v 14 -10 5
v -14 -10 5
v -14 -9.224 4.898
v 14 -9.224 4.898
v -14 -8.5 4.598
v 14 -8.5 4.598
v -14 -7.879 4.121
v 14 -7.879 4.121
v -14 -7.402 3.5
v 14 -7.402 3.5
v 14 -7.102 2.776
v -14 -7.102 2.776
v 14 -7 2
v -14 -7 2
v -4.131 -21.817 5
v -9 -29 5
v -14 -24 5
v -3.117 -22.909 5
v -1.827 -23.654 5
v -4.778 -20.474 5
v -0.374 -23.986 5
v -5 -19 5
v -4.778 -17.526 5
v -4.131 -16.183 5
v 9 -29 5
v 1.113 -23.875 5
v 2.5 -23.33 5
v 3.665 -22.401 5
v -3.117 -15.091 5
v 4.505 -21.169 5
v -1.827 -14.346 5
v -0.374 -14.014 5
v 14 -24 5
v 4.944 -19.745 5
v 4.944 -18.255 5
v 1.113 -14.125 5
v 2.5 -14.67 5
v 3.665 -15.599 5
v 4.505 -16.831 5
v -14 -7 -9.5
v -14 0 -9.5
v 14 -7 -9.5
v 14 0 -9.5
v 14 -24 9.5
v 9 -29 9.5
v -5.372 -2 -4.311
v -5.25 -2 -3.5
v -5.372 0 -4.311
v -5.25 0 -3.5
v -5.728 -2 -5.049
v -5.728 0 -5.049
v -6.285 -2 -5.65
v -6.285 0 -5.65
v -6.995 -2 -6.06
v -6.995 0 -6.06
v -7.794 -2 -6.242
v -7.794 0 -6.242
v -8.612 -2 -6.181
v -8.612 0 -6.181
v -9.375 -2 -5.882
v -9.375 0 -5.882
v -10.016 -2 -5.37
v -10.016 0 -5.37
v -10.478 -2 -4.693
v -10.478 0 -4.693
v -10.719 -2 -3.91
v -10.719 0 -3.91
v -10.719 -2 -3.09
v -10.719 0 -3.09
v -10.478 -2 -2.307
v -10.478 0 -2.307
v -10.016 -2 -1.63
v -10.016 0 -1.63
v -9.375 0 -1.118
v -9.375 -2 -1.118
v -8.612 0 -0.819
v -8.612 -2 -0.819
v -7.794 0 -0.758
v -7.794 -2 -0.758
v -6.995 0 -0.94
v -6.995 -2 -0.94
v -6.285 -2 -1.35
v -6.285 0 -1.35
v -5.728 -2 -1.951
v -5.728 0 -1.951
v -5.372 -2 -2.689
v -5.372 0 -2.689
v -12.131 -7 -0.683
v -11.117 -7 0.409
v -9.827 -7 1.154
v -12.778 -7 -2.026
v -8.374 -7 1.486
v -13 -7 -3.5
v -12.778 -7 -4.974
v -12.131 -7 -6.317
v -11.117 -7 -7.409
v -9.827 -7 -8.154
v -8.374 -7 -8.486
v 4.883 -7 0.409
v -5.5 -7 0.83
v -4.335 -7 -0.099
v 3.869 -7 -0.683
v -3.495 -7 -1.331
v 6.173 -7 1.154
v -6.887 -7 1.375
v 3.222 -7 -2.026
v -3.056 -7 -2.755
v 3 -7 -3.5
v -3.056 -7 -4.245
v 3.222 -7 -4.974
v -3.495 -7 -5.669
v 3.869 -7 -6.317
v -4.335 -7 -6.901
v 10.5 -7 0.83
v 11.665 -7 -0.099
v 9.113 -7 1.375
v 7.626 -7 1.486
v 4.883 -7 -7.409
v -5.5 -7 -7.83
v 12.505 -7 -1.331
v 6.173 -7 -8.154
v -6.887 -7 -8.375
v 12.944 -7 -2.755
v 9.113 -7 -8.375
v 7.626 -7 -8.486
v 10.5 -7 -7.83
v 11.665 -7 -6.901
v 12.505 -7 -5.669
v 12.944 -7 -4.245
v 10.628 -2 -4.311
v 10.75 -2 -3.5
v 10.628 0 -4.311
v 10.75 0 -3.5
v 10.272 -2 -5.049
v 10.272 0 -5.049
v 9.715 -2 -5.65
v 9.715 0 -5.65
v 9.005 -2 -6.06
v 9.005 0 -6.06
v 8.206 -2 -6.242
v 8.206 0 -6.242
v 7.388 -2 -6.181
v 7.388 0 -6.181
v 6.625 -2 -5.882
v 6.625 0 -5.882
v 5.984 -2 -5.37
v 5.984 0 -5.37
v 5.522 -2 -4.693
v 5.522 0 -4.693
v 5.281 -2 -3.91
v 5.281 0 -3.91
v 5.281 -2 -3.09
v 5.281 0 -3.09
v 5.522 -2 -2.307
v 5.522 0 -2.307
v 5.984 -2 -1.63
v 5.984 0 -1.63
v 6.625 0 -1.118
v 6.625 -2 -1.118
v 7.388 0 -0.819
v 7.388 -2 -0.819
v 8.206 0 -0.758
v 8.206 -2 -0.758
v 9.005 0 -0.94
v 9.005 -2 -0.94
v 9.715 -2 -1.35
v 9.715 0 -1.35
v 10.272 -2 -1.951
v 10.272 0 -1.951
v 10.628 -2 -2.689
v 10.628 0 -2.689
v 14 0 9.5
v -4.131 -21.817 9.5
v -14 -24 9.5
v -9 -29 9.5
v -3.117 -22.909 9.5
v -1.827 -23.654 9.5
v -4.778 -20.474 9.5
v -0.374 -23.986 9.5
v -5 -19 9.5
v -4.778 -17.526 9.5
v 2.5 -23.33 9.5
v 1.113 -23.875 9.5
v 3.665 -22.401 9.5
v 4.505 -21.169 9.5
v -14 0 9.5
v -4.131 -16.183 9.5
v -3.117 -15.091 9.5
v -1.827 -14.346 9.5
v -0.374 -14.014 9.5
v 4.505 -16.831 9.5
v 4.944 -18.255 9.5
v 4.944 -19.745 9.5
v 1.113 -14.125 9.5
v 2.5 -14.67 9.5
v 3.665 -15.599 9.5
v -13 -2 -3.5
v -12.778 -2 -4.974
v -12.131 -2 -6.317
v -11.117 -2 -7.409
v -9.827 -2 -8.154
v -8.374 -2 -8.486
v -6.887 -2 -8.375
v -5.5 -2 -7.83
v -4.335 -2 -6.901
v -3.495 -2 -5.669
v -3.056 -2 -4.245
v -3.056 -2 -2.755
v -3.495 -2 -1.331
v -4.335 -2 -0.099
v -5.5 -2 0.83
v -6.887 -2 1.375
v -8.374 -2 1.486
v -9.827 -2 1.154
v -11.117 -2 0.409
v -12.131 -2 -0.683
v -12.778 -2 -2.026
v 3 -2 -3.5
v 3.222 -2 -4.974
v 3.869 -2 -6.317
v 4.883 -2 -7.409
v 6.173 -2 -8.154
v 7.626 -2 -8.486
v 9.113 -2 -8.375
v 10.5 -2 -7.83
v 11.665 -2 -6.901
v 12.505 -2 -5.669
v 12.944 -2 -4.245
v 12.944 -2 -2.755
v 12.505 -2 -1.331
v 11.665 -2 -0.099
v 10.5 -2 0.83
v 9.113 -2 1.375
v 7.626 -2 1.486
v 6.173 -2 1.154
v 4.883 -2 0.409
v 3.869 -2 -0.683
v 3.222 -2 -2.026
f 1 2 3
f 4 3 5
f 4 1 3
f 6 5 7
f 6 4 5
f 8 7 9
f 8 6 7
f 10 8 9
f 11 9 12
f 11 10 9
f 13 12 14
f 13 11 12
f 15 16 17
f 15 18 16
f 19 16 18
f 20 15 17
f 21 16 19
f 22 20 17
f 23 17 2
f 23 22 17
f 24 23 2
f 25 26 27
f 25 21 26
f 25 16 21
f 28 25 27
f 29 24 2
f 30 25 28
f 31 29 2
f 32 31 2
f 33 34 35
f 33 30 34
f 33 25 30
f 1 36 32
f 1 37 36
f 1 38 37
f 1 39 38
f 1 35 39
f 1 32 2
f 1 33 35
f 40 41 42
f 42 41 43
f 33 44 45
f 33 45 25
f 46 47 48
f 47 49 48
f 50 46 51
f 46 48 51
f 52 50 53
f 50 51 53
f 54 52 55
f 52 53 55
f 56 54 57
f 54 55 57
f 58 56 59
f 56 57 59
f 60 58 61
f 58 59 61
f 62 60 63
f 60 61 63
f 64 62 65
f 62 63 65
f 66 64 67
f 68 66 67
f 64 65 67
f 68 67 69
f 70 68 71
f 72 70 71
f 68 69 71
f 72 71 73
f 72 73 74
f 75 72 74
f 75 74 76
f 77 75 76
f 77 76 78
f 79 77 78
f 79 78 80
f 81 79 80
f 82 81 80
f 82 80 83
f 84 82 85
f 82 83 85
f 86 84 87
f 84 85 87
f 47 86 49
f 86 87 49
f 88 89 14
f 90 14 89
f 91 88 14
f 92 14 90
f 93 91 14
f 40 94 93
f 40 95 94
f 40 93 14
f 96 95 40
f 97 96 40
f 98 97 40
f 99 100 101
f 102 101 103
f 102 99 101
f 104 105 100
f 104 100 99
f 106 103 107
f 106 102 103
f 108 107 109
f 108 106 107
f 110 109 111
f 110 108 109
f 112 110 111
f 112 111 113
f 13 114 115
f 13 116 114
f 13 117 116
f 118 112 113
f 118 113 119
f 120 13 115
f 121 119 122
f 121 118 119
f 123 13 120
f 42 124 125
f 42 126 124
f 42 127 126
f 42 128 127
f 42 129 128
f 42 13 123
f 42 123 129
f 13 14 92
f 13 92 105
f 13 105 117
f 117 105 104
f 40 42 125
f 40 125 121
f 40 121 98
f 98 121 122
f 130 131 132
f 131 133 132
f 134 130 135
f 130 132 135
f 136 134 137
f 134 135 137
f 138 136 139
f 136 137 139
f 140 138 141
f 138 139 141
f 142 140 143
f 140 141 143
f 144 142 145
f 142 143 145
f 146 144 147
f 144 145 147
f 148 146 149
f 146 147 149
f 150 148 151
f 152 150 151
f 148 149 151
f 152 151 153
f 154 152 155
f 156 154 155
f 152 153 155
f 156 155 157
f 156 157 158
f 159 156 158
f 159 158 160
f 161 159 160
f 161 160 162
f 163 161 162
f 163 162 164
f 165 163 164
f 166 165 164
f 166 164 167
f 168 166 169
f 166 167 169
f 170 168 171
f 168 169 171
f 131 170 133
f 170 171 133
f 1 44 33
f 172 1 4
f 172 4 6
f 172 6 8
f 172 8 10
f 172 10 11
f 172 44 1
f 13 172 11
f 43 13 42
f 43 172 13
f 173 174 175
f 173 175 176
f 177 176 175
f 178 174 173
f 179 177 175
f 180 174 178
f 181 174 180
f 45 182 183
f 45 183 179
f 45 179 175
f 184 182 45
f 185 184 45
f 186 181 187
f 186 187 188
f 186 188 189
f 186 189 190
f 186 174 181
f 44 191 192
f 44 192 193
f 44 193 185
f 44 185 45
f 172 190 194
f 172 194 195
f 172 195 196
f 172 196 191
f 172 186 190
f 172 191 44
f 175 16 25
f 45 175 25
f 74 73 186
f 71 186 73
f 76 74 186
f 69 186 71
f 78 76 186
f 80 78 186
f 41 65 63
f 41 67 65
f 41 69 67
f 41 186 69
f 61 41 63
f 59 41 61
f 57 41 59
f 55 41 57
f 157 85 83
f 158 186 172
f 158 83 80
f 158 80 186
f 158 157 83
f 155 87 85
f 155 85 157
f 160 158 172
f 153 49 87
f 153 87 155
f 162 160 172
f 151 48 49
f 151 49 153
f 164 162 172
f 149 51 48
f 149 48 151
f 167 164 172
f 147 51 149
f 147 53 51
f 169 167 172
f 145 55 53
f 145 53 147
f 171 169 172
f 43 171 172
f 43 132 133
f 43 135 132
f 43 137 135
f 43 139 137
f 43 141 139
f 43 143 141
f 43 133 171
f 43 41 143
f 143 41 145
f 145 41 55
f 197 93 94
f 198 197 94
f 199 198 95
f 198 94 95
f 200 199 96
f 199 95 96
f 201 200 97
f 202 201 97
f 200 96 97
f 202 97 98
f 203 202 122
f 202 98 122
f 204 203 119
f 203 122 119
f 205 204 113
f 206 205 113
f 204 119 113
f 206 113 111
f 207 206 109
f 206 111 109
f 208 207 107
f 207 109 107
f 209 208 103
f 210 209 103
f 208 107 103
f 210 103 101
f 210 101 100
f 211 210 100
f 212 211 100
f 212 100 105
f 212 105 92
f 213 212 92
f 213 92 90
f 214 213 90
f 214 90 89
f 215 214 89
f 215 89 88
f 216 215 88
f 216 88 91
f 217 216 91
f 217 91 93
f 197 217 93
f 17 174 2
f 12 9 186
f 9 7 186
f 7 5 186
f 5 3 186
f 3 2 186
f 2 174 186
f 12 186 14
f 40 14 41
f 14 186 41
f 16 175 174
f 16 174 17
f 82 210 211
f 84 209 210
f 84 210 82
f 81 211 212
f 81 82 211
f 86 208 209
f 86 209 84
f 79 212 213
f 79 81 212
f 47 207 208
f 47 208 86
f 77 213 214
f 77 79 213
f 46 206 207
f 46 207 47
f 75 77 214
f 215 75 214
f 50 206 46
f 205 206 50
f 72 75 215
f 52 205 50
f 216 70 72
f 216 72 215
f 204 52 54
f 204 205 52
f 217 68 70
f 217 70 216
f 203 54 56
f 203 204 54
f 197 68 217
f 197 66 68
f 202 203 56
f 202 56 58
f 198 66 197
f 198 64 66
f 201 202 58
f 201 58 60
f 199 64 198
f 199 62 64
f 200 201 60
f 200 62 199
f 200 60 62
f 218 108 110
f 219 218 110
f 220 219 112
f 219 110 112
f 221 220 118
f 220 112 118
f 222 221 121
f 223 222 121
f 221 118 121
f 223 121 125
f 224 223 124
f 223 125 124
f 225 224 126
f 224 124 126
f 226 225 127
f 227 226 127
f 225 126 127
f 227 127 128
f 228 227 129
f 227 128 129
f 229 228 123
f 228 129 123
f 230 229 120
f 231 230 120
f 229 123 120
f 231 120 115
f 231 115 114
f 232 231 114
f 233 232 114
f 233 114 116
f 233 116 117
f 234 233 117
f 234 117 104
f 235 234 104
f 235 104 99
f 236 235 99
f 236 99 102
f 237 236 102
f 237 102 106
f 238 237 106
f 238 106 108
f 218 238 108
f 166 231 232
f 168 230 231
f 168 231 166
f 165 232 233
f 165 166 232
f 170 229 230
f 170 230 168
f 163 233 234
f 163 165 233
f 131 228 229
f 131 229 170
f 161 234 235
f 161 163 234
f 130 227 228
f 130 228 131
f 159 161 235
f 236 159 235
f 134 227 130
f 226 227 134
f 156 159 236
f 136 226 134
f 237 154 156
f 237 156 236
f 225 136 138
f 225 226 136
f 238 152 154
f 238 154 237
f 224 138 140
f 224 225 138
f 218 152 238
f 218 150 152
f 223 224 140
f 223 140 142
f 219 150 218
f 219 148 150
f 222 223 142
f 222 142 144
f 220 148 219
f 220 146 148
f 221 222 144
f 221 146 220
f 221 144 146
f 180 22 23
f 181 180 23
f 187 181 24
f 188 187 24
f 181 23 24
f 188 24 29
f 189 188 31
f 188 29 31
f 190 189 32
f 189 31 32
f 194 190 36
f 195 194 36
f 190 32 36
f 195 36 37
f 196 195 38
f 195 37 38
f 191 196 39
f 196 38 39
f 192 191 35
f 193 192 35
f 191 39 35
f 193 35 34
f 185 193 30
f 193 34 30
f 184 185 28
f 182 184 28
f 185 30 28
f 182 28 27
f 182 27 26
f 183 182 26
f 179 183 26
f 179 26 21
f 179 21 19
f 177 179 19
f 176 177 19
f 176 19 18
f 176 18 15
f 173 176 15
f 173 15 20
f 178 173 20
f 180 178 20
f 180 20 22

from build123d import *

# Parameters (mm, degrees)
SKETCH_1_W                  = 28
SKETCH_1_H                  = 19
EXTRUDE_1_DEPTH             = 29
CUT_EXTRUDE_1_DEPTH         = 42.41557678
HOLE_WIZARD_1_D             = 10
HOLE_WIZARD_1_2_D           = 5.5
HOLE_WIZARD_1_2_CBORE_D     = 10
HOLE_WIZARD_1_2_CBORE_DEPTH = 5
CHAMFER_1_SIZE              = 5


with BuildPart() as part:
    # 草图1 → 凸台-拉伸1 (new body)
    with BuildSketch(Plane(origin=(0, 0, 0), x_dir=(1, 0, 0), z_dir=(0, 1, 0))):
        Rectangle(SKETCH_1_W, SKETCH_1_H)
    extrude(amount=-EXTRUDE_1_DEPTH)

    # 草图2 → 切除-拉伸1 (cut, through all)
    with BuildSketch(Plane(origin=(14, 0, 0), x_dir=(0, 0, -1), z_dir=(1, 0, 0))):
        with BuildLine():
            Line((9.5, -29), (-5, -29))
            Line((-5, -29), (-5, -10))
            ThreePointArc((-5, -10), (-4.121320344, -7.878679656), (-2, -7))
            Line((-2, -7), (9.5, -7))
            Line((9.5, -7), (9.5, -29))
        make_face()
    extrude(amount=-CUT_EXTRUDE_1_DEPTH, mode=Mode.SUBTRACT)

    # Hole Wizard 1 (through all)
    with Locations(Plane.XY.offset(9.5)):
        with Locations((0, -19)):
            Hole(HOLE_WIZARD_1_D / 2)

    # Hole Wizard 1 2 (through all)
    with Locations(Plane(origin=(0, -7, 0), x_dir=(-1, 0, 0), z_dir=(0, -1, 0))):
        with Locations((8, 3.5), (-8, 3.5)):
            CounterBoreHole(HOLE_WIZARD_1_2_D / 2, HOLE_WIZARD_1_2_CBORE_D / 2, HOLE_WIZARD_1_2_CBORE_DEPTH)

    # 倒角1
    chamfer_1_edges = [part.edges().sort_by_distance(p)[0] for p in [
        (-14, -29, 7.25),
        (14, -29, 7.25),
    ]]
    chamfer(chamfer_1_edges, length=CHAMFER_1_SIZE)


solid = part.part
